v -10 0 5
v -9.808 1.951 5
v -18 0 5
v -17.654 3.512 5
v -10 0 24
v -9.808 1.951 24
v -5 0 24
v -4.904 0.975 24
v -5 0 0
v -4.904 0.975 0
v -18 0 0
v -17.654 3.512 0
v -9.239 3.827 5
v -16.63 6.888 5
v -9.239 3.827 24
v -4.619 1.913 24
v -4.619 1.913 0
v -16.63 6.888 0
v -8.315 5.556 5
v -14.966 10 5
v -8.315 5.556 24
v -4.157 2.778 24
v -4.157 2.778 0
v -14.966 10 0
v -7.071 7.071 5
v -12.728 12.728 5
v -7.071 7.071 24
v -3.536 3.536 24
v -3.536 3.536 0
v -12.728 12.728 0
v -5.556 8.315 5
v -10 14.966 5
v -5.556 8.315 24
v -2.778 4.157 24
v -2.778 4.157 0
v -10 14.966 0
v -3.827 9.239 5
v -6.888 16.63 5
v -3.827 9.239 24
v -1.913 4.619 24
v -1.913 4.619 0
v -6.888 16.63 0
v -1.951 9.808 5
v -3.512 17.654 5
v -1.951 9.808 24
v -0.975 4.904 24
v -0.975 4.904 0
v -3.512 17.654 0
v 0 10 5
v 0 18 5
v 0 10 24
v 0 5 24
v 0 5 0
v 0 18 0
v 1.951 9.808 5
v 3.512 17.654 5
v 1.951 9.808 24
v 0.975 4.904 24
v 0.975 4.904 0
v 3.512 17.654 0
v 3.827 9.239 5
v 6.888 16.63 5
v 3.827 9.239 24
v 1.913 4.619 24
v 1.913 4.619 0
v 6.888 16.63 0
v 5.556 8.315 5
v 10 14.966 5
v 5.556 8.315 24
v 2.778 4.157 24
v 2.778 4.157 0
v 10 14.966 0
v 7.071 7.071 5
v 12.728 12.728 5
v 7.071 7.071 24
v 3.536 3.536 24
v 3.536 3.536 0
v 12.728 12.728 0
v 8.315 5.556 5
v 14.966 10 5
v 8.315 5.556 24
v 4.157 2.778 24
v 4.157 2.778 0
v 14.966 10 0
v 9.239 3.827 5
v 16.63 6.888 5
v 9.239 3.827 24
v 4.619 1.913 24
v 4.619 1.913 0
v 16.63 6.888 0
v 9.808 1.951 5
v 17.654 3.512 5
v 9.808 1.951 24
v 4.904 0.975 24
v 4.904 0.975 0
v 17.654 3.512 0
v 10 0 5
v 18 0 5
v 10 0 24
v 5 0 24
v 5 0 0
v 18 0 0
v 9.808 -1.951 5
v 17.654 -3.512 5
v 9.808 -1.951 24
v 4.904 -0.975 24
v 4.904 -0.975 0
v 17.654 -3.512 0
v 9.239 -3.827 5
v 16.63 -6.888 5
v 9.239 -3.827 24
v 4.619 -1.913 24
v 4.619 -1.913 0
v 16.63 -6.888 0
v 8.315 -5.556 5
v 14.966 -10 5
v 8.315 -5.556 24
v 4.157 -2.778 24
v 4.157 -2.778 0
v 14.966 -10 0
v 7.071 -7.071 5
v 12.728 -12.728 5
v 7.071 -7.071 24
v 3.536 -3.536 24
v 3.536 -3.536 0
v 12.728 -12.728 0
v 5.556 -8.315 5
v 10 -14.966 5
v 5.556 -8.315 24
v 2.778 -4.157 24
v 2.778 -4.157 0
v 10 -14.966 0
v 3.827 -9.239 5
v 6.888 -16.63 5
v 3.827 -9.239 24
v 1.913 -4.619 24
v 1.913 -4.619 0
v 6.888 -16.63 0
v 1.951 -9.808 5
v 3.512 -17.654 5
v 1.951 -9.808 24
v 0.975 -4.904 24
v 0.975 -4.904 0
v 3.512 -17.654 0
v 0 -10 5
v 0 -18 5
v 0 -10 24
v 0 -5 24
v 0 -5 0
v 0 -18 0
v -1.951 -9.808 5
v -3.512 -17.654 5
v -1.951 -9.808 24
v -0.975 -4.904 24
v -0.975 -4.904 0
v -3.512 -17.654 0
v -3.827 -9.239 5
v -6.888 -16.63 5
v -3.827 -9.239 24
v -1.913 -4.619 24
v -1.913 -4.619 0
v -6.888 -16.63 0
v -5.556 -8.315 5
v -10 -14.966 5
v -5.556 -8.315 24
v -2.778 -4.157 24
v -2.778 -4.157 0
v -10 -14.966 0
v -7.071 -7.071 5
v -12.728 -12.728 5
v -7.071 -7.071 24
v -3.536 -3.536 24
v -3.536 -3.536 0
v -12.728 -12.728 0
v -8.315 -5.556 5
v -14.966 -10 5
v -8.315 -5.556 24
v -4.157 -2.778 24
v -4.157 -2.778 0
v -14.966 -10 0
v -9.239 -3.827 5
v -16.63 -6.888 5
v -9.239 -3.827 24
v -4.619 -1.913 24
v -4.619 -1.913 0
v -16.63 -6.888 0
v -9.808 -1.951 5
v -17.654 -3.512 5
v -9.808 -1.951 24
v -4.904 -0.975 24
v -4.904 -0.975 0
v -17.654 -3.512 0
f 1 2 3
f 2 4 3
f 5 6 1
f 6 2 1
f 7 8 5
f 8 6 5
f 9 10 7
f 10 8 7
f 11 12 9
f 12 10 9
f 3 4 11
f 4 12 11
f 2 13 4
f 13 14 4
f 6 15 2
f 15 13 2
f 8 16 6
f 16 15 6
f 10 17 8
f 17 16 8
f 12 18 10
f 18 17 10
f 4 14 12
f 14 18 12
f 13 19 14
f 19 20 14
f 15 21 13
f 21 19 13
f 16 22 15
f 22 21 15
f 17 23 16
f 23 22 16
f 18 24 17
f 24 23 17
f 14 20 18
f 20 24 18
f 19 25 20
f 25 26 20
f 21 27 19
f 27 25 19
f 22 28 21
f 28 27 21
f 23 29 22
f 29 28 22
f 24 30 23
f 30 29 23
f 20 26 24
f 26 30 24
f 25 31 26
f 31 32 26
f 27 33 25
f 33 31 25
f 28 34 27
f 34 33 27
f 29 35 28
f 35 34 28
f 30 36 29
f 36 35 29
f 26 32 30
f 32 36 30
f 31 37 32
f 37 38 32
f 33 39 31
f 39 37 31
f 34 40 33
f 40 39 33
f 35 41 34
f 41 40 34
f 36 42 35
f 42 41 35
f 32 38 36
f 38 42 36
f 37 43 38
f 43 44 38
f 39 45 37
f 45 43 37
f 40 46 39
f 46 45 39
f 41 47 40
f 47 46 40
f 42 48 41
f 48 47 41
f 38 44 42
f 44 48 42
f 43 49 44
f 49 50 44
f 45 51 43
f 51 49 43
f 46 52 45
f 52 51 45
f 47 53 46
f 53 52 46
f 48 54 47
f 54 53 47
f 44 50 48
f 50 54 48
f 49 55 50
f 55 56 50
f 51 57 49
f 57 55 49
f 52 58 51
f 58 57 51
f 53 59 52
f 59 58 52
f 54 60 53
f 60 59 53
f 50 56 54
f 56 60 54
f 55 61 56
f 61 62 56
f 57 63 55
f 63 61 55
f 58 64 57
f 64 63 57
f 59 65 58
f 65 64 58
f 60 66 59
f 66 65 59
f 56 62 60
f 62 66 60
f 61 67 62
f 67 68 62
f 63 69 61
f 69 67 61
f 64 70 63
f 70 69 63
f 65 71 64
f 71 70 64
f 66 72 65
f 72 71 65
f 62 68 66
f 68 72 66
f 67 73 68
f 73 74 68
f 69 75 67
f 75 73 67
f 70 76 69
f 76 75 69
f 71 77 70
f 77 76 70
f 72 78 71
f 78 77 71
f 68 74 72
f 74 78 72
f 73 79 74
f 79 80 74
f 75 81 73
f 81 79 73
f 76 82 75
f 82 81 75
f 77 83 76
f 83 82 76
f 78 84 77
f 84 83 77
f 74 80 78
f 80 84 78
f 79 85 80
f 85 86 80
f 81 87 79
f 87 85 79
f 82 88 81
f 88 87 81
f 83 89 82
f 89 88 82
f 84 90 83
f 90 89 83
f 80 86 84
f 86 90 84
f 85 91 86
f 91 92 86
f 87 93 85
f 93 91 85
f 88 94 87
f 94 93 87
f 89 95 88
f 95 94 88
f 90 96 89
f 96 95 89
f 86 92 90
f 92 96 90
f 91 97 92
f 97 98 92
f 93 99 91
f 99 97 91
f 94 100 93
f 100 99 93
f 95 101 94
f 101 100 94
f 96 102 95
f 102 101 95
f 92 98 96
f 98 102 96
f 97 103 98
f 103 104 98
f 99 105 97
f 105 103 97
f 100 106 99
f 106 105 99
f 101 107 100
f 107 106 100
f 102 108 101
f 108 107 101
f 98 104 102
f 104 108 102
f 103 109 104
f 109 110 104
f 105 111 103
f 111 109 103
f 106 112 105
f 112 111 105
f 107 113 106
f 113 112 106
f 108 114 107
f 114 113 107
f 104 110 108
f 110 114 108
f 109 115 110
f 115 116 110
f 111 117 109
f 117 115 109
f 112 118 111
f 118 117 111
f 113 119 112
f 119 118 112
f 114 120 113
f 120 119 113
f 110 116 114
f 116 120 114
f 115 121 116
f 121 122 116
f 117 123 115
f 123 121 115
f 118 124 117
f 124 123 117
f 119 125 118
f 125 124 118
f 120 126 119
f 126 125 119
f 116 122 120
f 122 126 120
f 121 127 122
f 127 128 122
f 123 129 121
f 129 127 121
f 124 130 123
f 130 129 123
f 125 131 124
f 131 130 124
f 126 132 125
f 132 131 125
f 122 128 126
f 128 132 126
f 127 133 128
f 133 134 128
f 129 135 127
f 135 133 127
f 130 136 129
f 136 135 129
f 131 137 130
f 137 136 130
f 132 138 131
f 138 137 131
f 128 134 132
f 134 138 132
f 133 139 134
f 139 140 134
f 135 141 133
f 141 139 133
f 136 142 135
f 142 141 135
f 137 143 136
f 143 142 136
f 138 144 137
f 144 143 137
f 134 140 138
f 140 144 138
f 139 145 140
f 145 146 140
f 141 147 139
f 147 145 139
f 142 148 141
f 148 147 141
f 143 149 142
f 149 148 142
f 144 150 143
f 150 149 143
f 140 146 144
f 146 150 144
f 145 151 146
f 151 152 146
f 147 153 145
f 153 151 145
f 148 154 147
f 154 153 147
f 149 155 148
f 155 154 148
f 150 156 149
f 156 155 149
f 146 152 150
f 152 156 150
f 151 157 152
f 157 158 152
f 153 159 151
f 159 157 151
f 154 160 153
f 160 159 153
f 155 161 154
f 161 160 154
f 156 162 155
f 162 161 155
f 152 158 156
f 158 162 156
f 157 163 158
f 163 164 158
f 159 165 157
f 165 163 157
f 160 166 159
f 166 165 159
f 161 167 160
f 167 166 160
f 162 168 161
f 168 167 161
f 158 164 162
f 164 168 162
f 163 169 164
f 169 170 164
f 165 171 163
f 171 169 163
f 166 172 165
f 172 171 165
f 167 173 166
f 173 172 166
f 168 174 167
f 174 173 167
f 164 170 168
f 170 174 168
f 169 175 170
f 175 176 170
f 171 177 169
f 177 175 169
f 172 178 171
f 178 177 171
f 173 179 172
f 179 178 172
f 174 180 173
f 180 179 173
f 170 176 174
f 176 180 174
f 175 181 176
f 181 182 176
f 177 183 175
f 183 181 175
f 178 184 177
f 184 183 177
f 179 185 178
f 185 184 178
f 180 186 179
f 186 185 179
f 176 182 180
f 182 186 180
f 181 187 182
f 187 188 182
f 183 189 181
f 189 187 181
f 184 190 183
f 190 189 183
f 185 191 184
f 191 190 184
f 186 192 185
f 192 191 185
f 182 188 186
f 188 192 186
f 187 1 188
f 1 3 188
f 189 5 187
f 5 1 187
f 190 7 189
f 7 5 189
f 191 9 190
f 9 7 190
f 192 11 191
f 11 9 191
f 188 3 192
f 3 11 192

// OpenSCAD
$fn = 32;

// ----------------------------------------------------------------------
// Revolved part: flanged bushing R18
// ----------------------------------------------------------------------

// --- parameters (mm) ---
bore_r = 5;               // bore radius
flange_r = 18;            // flange radius
flange_h = 5;             // flange thickness
sleeve_r = 10;            // sleeve radius
total_h = 24;             // overall height
revolve_angle = 360;      // revolve sweep, degrees

bore_d = 2 * bore_r;
flange_d = 2 * flange_r;
sleeve_d = 2 * sleeve_r;

profile = [[5, 0], [18, 0], [18, 5], [10, 5], [10, 24], [5, 24]];  // primary outline, 6 points, counter clockwise

// --- the one profile operation ---
rotate_extrude(angle = revolve_angle) polygon(points = profile);
